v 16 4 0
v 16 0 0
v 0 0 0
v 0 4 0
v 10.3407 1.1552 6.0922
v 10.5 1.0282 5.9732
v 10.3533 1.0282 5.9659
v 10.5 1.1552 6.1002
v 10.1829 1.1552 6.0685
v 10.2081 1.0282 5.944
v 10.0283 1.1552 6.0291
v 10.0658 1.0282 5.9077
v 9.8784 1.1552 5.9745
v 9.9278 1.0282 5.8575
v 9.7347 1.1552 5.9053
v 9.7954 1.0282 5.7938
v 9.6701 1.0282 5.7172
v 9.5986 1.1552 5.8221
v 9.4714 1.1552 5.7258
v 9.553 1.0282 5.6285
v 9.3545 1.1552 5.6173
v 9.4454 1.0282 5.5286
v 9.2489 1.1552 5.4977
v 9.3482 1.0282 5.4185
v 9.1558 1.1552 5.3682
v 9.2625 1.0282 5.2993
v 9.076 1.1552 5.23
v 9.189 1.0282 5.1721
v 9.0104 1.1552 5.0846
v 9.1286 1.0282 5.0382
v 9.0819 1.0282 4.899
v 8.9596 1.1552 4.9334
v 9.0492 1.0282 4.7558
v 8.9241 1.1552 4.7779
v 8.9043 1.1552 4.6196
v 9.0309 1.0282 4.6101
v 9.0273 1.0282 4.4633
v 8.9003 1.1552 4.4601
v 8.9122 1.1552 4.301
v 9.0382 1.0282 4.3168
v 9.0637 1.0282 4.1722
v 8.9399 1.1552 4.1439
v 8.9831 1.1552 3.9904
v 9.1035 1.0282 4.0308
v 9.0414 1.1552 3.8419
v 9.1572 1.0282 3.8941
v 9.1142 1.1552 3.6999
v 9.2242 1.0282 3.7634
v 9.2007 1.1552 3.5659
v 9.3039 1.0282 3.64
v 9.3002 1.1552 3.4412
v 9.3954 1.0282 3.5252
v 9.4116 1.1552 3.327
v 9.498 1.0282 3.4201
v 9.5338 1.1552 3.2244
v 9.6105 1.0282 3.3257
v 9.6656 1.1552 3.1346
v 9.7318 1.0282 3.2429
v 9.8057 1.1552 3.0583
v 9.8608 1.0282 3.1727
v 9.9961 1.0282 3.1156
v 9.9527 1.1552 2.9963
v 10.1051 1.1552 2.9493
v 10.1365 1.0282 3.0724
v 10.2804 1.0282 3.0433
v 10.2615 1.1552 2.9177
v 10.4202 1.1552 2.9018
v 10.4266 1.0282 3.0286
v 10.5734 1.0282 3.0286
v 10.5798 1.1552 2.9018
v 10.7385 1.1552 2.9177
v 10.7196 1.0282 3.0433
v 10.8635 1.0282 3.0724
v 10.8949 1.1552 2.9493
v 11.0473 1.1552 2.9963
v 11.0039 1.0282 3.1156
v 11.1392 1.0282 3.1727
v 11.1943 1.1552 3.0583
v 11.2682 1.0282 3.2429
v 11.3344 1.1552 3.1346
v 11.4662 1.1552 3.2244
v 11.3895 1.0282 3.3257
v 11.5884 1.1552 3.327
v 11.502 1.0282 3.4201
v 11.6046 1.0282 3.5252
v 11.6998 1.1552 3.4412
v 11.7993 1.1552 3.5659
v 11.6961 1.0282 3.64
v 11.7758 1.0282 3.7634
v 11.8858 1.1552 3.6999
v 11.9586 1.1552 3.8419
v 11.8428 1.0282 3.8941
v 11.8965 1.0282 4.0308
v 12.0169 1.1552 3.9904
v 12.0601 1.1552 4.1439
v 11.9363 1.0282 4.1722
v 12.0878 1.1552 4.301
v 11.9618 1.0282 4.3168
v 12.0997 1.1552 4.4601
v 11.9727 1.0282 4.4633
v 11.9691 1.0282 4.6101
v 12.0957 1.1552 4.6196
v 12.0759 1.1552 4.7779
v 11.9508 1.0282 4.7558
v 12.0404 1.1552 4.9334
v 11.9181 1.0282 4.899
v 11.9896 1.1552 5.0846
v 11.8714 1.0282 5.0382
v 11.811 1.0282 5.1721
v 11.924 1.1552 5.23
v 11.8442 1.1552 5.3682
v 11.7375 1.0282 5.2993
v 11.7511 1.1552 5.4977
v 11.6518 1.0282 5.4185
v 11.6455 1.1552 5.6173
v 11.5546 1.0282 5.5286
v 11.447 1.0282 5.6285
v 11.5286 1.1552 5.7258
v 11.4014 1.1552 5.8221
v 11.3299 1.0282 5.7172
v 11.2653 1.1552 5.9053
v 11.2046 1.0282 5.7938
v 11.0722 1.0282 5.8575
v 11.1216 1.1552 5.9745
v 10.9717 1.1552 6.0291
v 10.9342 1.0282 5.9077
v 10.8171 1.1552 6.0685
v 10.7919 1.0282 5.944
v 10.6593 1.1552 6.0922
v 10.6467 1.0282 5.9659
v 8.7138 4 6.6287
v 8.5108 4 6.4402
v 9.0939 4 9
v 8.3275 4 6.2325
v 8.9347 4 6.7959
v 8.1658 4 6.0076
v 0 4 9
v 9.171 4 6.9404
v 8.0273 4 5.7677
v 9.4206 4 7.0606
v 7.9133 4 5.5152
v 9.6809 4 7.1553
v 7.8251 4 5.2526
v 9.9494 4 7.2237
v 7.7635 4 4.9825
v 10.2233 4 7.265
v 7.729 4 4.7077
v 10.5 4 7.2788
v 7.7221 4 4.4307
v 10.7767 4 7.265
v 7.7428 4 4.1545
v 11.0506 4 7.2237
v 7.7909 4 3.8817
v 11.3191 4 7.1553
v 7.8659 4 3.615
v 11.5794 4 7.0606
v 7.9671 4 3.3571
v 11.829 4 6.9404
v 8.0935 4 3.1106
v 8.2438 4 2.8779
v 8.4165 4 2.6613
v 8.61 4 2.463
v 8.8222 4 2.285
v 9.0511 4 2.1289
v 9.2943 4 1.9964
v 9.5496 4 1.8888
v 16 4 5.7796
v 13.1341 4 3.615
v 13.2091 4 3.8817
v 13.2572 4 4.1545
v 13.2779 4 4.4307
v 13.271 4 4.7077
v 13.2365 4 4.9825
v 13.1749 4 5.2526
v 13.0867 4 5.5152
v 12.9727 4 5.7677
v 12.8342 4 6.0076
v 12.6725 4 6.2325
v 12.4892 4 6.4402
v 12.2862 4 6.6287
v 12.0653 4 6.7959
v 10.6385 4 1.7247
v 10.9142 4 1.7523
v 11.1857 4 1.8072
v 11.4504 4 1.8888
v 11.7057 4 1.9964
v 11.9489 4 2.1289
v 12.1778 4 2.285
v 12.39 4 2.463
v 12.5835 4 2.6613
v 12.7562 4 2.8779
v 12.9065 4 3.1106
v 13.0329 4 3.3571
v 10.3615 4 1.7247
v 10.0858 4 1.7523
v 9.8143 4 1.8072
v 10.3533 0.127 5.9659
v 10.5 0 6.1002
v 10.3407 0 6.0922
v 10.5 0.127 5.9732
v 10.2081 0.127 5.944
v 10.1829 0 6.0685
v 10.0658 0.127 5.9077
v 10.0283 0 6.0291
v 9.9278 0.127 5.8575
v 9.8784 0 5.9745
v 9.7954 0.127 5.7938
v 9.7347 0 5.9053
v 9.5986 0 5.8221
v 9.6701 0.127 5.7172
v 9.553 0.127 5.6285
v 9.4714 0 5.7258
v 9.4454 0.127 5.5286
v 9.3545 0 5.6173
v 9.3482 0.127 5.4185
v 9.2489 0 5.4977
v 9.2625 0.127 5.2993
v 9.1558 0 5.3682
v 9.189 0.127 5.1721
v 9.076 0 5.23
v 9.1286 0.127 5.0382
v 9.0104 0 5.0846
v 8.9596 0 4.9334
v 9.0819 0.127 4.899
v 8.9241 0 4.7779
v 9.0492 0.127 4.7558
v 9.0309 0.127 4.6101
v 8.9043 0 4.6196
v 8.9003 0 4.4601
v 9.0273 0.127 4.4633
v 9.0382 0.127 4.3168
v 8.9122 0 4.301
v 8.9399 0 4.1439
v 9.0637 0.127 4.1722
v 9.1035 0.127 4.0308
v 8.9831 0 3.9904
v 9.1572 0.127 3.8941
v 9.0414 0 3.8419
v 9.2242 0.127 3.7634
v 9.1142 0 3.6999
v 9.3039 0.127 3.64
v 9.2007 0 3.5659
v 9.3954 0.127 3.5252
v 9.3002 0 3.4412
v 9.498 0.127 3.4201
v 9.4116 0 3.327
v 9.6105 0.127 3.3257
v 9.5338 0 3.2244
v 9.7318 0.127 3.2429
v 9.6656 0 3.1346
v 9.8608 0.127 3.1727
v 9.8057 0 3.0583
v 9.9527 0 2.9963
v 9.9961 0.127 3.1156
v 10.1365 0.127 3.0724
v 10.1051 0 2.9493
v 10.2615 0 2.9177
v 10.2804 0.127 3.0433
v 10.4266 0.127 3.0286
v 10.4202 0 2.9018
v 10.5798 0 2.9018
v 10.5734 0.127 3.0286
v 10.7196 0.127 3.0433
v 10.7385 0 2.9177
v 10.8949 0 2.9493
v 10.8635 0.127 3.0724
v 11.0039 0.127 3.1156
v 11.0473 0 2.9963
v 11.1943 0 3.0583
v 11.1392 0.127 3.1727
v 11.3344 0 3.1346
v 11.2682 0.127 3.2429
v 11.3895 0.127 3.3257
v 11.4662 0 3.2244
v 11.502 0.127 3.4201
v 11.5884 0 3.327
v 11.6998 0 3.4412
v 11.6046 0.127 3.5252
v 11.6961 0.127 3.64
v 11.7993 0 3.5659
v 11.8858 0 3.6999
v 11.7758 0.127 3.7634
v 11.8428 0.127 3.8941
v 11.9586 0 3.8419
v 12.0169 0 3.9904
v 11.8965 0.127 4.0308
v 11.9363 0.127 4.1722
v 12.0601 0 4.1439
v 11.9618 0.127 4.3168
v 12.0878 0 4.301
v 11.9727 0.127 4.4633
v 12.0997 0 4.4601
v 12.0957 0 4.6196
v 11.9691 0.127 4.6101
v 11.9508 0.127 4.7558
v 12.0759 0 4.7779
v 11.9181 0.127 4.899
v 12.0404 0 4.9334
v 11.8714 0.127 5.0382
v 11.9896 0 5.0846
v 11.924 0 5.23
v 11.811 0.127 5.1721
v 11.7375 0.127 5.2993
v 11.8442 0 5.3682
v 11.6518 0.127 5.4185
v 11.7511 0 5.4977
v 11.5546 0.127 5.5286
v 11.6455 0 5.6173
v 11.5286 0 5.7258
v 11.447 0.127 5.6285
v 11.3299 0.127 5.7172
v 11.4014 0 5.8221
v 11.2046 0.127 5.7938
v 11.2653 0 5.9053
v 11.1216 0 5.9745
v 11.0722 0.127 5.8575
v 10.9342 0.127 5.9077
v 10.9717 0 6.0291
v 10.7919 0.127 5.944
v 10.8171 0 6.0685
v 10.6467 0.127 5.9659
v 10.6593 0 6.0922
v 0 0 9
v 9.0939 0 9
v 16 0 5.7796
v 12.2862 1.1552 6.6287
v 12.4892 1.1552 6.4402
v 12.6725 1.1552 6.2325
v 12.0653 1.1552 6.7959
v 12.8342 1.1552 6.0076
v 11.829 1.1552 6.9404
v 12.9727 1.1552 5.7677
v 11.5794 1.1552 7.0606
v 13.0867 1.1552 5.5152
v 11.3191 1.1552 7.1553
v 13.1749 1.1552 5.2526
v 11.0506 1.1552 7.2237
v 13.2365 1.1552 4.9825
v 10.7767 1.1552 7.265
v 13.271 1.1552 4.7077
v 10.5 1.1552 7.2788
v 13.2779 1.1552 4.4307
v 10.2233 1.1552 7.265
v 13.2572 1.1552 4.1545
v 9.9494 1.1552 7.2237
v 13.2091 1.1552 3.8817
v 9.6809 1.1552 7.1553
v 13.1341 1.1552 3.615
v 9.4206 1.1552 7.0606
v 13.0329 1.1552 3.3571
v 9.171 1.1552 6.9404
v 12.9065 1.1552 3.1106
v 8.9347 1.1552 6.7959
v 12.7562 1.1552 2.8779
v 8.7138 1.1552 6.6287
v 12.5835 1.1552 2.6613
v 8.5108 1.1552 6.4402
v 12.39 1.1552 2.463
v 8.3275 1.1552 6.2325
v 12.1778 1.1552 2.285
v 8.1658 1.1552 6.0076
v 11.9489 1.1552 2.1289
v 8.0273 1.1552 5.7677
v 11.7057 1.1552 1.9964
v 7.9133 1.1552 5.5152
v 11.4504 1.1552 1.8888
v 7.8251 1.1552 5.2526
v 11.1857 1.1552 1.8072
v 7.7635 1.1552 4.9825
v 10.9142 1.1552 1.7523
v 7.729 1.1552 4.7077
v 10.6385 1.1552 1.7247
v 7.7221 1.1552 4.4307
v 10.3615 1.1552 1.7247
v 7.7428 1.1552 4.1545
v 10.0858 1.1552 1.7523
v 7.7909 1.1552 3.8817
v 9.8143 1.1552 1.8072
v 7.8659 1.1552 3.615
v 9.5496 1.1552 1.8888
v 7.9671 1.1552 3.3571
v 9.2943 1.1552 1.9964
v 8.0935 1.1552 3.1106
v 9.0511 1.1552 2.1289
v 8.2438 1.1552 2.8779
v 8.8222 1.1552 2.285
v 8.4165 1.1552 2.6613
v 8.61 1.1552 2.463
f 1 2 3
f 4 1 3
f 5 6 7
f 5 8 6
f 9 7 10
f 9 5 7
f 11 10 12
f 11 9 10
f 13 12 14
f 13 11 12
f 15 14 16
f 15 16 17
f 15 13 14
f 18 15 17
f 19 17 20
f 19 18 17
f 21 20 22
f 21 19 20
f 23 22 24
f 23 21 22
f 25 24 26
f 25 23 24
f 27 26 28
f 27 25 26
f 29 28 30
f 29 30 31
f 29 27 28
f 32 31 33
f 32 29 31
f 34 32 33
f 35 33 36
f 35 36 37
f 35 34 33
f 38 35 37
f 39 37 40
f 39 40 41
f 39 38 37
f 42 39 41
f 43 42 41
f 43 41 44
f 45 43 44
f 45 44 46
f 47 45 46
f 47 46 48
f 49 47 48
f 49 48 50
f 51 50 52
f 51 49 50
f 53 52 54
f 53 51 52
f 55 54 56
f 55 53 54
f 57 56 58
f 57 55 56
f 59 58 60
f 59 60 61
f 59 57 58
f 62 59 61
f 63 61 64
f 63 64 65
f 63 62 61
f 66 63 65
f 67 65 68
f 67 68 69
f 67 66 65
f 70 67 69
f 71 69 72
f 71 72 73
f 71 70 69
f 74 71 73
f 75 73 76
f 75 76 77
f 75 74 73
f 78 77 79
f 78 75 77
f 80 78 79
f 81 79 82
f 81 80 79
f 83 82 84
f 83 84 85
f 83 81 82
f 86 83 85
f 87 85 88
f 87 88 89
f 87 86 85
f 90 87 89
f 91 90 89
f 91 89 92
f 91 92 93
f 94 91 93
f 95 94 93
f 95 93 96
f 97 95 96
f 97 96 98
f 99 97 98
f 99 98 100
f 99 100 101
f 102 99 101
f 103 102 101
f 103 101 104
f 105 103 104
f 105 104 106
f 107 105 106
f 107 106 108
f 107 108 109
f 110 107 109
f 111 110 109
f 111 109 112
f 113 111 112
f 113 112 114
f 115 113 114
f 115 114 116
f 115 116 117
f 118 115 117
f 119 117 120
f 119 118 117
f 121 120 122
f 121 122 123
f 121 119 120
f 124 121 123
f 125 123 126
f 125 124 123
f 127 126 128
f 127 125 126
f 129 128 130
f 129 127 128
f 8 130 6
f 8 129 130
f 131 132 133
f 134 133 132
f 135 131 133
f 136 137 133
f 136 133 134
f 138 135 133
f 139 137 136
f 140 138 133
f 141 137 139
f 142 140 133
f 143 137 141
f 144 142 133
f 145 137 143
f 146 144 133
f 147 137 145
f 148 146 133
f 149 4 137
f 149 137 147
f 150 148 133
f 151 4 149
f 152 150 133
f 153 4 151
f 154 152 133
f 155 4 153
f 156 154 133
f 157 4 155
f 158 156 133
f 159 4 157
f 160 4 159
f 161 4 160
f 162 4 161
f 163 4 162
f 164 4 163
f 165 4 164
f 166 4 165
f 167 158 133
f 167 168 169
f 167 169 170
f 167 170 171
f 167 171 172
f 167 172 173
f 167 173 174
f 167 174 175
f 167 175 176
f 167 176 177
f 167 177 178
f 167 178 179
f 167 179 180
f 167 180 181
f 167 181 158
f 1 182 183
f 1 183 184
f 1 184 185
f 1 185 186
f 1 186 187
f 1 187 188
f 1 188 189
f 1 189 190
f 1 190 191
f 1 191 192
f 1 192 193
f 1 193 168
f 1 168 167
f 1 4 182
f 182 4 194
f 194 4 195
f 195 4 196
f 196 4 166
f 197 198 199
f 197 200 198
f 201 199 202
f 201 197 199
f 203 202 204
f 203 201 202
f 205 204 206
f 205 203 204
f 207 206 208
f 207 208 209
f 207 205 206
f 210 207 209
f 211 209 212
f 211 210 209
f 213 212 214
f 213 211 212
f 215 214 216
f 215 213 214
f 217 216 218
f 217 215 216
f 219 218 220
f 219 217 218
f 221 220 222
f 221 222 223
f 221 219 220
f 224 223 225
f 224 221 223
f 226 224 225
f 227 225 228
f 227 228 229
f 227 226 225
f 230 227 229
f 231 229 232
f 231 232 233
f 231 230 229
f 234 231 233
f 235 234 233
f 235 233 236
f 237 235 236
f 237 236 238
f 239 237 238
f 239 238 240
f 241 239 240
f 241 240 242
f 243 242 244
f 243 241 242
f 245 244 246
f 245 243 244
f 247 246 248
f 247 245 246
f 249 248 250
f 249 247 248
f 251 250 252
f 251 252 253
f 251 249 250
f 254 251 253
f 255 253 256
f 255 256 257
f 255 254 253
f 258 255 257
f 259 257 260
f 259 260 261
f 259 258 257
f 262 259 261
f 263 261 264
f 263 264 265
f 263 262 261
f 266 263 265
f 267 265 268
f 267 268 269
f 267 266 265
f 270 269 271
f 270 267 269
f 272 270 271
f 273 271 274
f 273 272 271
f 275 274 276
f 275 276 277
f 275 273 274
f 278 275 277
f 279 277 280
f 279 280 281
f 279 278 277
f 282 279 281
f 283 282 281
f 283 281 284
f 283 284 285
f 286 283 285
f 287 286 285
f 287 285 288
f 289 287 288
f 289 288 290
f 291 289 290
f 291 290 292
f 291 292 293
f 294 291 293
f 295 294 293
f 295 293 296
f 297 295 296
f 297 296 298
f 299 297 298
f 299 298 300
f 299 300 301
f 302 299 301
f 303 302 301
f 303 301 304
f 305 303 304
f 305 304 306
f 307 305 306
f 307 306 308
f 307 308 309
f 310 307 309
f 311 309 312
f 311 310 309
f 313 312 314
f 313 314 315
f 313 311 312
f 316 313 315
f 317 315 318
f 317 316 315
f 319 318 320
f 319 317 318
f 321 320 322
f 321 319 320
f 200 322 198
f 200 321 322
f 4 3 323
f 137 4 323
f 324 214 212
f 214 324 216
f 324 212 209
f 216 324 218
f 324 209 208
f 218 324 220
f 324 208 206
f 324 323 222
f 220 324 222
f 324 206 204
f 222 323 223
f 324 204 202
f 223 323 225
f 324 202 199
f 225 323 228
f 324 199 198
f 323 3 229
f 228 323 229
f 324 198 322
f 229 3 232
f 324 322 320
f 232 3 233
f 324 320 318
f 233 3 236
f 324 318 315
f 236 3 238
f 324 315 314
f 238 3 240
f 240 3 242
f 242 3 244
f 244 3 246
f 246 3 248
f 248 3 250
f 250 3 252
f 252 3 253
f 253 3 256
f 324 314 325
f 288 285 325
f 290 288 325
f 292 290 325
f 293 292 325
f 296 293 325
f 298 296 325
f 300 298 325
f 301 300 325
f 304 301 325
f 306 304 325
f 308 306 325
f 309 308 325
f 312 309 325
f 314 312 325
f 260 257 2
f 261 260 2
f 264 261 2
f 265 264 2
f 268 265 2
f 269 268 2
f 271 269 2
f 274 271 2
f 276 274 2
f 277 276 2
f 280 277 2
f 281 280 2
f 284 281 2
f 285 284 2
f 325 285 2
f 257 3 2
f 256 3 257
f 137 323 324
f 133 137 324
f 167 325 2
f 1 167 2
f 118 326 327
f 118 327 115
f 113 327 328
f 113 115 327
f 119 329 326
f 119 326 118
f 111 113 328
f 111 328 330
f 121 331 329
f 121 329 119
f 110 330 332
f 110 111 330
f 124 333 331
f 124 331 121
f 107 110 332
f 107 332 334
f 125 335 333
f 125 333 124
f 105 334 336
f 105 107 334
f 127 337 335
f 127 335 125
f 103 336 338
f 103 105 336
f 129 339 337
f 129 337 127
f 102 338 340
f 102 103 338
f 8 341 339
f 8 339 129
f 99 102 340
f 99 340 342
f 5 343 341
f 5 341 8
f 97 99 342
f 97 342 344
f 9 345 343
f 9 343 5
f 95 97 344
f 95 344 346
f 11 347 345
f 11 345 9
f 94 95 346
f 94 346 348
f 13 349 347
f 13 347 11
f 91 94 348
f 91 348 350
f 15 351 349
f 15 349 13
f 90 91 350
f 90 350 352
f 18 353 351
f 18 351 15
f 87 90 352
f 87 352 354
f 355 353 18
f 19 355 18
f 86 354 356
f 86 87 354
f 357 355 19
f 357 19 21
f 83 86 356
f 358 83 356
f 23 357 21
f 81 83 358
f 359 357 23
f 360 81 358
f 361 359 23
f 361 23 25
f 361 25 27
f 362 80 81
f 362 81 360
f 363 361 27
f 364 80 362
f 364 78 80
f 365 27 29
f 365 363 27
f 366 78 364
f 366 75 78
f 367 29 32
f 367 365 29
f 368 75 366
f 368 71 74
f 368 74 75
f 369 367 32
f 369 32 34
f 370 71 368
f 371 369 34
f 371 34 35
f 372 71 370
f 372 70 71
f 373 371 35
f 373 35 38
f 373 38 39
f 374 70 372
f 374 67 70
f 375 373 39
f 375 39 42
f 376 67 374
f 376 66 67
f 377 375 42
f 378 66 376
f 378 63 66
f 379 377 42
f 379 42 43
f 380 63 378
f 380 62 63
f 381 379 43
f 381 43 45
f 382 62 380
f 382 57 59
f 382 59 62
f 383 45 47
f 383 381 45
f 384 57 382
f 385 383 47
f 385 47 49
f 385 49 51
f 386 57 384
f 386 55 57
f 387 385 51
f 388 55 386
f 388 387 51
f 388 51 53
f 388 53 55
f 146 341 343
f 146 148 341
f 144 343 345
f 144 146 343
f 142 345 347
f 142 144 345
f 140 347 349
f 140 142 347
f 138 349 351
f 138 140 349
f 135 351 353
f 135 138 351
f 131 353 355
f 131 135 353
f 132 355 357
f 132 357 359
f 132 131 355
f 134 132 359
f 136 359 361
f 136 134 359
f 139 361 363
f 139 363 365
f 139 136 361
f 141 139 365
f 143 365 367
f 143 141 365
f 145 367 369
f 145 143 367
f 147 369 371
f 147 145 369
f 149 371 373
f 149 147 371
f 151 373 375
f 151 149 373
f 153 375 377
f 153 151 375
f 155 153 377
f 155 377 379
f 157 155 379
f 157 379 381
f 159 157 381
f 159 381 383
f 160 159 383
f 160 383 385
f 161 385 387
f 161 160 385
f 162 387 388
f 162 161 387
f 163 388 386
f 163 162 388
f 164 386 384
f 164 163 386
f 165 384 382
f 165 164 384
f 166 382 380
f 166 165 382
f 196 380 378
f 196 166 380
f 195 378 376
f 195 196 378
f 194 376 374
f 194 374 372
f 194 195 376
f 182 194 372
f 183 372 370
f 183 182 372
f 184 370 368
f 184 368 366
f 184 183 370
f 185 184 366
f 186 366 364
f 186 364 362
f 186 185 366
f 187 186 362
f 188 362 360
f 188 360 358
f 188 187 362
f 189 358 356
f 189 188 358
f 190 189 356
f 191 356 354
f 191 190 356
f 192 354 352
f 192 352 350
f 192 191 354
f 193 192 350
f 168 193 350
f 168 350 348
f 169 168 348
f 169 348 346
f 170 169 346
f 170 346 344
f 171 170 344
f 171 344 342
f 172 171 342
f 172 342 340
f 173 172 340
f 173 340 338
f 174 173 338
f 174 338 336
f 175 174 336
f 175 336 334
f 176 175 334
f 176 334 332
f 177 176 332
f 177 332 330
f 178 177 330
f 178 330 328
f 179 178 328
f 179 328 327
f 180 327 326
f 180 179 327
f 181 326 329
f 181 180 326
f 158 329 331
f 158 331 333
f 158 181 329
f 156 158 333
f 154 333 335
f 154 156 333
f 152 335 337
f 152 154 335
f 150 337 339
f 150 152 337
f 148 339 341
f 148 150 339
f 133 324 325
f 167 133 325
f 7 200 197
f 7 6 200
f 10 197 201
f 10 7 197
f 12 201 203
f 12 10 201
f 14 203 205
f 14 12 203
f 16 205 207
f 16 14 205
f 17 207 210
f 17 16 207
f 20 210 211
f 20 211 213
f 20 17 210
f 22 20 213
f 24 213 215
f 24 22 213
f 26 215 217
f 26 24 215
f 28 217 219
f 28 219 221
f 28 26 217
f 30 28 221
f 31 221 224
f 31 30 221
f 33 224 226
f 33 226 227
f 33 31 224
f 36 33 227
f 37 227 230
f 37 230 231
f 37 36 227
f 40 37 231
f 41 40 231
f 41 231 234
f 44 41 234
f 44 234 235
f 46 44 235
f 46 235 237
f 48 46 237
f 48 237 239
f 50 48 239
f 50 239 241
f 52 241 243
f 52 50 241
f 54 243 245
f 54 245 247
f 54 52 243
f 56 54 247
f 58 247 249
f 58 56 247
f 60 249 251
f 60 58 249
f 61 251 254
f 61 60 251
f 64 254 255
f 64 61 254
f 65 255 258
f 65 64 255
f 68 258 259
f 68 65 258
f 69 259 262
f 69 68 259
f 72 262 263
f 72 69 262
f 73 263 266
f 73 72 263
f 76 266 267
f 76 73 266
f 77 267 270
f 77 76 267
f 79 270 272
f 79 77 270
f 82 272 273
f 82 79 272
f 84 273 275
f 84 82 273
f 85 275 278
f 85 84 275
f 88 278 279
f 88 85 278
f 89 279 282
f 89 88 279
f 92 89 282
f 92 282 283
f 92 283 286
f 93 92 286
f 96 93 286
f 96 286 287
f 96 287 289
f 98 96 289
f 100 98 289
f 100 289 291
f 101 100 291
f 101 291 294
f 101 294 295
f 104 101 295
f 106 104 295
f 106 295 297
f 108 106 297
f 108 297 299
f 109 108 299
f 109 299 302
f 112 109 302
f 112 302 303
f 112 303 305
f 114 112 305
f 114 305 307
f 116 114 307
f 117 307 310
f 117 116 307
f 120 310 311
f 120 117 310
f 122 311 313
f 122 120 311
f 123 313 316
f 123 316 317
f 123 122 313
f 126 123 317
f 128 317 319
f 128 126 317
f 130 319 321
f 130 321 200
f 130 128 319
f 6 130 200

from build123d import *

# Parameters (mm, degrees)
EXTRUDE_1_DEPTH = 4


with BuildPart() as part:
    # Эскиз1 → Бобышка-Вытянуть1 (new body)
    with BuildSketch(Plane(origin=(0, 0, 0), x_dir=(1, 0, 0), z_dir=(0, 1, 0))):
        Polygon((0, 0), (0, -9), (9.093856713, -9), (16, -5.779612497), (16, 0), align=None)
    extrude(amount=EXTRUDE_1_DEPTH)

    # Эскиз2 → Цековка для  винта с внутренним шестигранником #41 (revolve, cut)
    with BuildSketch(Plane(origin=(10.5, 4, 4.5), x_dir=(0, 0, 1), z_dir=(1, 0, 0))):
        Polygon((0, 0), (0, 4), (1.6002, 4), (1.4732, 3.873), (1.4732, 2.9718), (1.6002, 2.8448), (2.77876, 2.8448), (2.77876, 0), align=None)
    revolve(axis=Axis((10.5, 10.35, 4.5), (0, -1, 0)), mode=Mode.SUBTRACT)


solid = part.part
